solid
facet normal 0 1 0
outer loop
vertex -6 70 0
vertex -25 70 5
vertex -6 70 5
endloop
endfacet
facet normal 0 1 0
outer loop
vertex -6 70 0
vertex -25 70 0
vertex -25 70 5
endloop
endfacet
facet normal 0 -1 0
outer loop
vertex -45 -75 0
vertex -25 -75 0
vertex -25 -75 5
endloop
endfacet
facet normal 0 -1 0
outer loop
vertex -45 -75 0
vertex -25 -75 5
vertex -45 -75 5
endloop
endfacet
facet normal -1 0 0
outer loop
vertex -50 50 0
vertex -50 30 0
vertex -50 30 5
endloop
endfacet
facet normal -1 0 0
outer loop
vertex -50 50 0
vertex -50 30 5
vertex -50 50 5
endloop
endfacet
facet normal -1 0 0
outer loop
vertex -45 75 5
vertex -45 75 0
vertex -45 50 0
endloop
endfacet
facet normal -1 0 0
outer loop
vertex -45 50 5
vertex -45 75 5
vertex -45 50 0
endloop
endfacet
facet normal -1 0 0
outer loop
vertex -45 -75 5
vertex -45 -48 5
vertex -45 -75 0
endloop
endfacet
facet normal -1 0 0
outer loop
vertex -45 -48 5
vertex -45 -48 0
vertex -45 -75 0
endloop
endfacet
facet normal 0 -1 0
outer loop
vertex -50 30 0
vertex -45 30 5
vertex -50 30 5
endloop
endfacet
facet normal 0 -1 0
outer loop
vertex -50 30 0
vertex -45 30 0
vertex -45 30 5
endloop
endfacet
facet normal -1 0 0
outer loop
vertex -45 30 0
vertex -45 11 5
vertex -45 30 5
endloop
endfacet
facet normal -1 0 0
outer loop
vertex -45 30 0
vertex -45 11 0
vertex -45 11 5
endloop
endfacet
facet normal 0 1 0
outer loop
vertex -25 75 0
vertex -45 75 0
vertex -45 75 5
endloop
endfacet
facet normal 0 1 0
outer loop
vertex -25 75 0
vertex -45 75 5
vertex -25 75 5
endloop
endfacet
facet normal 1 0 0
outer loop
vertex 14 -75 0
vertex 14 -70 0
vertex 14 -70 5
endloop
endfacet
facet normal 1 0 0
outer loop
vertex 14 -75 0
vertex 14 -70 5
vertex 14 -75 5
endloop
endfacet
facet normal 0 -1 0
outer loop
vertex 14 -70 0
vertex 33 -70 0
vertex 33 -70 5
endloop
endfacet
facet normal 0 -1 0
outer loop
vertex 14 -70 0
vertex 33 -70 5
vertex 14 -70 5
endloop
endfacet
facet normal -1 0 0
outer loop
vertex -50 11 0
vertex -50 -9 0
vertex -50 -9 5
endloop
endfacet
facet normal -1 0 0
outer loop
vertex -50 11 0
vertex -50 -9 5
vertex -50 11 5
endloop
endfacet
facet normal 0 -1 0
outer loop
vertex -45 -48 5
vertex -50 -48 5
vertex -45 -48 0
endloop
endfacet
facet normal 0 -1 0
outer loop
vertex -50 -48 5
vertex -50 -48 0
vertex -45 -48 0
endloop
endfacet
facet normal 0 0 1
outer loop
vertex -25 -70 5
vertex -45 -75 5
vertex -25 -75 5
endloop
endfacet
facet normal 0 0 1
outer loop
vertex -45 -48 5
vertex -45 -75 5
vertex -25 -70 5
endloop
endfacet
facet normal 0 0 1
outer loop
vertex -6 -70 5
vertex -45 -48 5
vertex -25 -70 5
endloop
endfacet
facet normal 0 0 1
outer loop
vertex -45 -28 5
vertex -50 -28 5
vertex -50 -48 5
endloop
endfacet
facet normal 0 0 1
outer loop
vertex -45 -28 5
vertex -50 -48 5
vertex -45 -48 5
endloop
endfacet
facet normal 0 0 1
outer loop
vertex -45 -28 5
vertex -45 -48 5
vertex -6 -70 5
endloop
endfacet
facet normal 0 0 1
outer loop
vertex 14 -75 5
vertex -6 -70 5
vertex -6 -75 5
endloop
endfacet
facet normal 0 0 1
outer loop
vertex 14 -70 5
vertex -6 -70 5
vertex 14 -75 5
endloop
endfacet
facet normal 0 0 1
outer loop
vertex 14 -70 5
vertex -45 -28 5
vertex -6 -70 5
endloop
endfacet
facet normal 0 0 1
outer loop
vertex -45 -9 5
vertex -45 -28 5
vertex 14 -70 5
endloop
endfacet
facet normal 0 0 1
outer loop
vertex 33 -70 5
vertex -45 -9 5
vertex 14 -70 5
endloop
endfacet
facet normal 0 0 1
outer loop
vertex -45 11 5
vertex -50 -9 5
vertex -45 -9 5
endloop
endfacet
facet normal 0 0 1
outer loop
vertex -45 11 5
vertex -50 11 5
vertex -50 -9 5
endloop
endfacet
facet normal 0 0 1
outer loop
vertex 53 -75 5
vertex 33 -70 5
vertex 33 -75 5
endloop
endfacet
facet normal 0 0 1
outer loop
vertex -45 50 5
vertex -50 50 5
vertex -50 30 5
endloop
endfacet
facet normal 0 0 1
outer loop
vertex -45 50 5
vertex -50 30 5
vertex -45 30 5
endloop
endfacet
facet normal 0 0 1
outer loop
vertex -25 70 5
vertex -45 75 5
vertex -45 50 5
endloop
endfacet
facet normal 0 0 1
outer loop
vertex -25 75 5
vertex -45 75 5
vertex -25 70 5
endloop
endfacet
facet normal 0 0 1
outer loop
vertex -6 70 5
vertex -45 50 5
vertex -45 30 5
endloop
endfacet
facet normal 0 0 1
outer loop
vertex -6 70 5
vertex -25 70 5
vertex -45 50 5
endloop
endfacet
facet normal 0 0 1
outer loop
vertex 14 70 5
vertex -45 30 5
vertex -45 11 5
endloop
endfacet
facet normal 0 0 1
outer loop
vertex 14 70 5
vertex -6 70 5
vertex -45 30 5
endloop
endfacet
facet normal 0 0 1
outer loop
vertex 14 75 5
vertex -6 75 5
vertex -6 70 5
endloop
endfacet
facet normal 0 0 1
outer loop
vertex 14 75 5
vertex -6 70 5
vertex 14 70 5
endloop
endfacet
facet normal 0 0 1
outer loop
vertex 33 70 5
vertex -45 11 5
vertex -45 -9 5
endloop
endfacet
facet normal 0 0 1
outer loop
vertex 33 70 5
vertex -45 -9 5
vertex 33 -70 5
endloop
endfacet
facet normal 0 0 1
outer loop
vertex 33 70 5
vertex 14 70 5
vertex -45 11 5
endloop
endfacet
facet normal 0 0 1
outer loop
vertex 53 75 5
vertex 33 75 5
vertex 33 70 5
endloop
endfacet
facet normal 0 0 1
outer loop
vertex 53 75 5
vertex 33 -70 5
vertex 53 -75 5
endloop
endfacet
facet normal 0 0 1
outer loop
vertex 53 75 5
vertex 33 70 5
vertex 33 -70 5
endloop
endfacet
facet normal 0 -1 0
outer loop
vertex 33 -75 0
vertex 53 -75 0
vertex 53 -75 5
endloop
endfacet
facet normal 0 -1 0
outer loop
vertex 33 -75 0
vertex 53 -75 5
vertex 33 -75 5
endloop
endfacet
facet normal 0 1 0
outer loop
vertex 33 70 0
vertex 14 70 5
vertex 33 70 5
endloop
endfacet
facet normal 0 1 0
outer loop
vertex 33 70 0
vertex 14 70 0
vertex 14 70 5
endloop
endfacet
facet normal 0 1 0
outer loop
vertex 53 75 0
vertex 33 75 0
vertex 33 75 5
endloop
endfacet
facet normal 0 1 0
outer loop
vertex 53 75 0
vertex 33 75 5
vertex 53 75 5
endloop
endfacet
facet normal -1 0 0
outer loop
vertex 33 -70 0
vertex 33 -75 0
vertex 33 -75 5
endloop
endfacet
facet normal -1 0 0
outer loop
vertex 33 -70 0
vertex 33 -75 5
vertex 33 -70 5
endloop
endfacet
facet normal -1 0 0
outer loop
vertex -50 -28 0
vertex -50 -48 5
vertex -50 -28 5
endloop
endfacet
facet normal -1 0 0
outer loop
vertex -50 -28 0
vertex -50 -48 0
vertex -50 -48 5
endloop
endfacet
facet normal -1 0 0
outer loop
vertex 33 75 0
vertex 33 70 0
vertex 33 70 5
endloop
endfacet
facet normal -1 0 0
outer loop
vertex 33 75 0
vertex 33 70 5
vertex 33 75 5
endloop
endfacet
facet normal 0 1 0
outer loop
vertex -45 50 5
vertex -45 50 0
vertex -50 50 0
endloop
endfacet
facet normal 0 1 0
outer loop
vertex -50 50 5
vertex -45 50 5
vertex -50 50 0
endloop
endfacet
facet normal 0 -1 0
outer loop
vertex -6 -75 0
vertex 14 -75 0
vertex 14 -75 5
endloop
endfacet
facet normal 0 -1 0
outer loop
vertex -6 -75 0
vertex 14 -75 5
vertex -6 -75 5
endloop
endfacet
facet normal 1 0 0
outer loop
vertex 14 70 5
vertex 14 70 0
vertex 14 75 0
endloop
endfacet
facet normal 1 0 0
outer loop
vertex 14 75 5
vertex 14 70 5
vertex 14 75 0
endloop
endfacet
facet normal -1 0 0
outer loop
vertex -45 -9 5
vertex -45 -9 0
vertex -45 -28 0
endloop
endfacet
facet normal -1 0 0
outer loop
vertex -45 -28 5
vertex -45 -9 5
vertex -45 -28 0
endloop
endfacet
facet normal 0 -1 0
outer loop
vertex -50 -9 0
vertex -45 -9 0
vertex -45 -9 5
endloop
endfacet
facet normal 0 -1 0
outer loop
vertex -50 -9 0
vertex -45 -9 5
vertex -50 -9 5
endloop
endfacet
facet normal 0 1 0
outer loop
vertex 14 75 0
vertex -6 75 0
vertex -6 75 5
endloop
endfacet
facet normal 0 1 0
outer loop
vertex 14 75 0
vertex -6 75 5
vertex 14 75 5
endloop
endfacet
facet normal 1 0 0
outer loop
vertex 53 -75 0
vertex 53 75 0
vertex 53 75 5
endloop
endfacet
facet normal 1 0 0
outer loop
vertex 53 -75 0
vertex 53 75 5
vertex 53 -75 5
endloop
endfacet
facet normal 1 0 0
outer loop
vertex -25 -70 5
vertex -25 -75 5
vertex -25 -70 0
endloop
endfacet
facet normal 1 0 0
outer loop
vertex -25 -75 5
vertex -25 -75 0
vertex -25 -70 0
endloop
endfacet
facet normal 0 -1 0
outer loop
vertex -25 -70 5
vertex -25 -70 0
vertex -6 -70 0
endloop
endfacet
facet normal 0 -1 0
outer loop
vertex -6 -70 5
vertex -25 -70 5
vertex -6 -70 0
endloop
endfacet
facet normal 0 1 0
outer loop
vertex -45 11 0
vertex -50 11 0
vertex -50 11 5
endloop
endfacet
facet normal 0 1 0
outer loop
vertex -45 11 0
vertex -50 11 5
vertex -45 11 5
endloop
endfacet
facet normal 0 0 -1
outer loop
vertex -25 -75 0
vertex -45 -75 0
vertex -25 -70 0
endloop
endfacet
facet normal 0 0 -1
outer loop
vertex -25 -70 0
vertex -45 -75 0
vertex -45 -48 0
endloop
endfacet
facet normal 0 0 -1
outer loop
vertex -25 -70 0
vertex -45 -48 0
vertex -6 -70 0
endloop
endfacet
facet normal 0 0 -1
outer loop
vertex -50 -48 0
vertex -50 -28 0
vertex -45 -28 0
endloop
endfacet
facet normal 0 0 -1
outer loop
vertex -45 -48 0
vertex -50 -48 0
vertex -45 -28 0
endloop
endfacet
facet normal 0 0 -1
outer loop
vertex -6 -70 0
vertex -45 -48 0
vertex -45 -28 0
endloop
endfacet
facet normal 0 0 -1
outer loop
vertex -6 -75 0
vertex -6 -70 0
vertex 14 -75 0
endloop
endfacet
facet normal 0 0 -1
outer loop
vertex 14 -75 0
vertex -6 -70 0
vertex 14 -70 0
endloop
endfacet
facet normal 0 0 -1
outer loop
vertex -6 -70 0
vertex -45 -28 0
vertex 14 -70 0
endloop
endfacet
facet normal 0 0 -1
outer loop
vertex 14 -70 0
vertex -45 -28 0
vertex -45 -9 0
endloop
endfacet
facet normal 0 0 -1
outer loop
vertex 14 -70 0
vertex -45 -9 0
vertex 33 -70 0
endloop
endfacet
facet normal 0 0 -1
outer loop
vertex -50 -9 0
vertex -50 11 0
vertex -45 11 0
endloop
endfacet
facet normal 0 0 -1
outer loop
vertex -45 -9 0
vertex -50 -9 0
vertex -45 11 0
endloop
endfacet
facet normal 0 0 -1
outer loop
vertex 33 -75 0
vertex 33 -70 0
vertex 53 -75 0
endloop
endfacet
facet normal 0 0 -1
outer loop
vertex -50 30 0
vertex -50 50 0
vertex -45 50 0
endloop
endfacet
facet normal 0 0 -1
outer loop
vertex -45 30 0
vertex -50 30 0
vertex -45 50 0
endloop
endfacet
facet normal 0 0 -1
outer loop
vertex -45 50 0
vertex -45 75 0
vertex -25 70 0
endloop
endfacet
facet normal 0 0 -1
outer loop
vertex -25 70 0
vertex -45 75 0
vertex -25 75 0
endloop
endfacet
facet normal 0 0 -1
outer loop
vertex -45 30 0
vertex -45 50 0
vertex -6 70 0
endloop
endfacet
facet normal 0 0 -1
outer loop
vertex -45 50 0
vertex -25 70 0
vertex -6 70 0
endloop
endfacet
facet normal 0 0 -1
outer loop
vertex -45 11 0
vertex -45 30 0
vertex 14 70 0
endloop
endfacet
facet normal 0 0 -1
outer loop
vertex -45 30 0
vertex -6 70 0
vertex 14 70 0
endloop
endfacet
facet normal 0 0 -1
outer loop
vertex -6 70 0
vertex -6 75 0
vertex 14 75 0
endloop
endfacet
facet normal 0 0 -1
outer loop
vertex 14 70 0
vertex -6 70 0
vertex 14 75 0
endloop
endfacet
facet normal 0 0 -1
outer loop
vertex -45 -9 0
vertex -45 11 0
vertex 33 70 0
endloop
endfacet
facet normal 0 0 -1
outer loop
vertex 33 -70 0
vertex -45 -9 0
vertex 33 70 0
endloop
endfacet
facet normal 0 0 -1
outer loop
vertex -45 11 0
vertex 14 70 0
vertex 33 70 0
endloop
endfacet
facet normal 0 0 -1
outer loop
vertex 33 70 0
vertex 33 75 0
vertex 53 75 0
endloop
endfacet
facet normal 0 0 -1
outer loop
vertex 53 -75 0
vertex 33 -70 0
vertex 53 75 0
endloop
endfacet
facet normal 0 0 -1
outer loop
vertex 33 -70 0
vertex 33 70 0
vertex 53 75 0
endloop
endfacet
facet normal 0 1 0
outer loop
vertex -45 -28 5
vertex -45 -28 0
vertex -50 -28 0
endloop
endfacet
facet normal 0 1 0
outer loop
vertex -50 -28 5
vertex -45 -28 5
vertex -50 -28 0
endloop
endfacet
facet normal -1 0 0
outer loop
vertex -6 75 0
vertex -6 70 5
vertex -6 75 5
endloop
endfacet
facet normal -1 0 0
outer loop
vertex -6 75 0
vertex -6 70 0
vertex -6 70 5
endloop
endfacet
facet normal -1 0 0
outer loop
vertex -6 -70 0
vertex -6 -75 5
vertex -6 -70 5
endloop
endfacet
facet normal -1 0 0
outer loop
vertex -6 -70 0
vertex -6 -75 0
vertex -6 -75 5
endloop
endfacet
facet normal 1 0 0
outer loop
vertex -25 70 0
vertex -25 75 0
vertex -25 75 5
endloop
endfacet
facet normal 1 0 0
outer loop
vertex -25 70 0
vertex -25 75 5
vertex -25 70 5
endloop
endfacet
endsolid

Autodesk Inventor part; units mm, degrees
ref_plane "YZ Plane" through (0, 0, 0) normal (1, 0, 0) x (0, 1, 0)
ref_plane "XZ Plane" through (0, 0, 0) normal (0, 1, 0) x (-1, 0, 0)
ref_plane "XY Plane" through (0, 0, 0) normal (0, 0, 1) x (1, 0, 0)
sketch "Sketch1" plane through (0, 0, 0) normal (0, 0, 1) x (1, 0, 0)
  line L0 (-50, 75) -> (50, 75)
  line L1 (50, 75) -> (50, -75)
  line L2 (50, -75) -> (-50, -75)
  line L3 (-50, -75) -> (-50, 75)
  line L4 (-50, 75) -> (-45, 75)
  line L5 (-45, 75) -> (-45, 50)
  line L6 (-45, 50) -> (-50, 50)
  line L7 (-50, 50) -> (-50, 75)
  line L8 (-50, 50) -> (-45, 50)
  line L9 (-45, 50) -> (-45, 30)
  line L10 (-45, 30) -> (-50, 30)
  line L11 (-50, 30) -> (-50, 50)
  line L12 (-45, 30) -> (-50, 30)
  line L13 (-50, 30) -> (-50, 11)
  line L14 (-50, 11) -> (-45, 11)
  line L15 (-45, 11) -> (-45, 30)
  line L16 (-50, 11) -> (-45, 11)
  line L17 (-45, 11) -> (-45, -9)
  line L18 (-45, -9) -> (-50, -9)
  line L19 (-50, -9) -> (-50, 11)
  line L20 (-50, -9) -> (-45, -9)
  line L21 (-45, -9) -> (-45, -28)
  line L22 (-45, -28) -> (-50, -28)
  line L23 (-50, -28) -> (-50, -9)
  line L24 (-45, -28) -> (-50, -28)
  line L25 (-50, -28) -> (-50, -48)
  line L26 (-50, -48) -> (-45, -48)
  line L27 (-45, -48) -> (-45, -28)
  line L28 (-50, -48) -> (-45, -48)
  line L29 (-45, -48) -> (-45, -67)
  line L30 (-50, -67) -> (-50, -48)
  line L31 (-45, -67) -> (-45, -75)
  line L32 (-45, -75) -> (-50, -75)
  line L33 (-50, -75) -> (-50, -67)
  line L34 (-45, 75) -> (-25, 75)
  line L35 (-25, 75) -> (-25, 70)
  line L36 (-25, 70) -> (-45, 70)
  line L37 (-45, 70) -> (-45, 75)
  line L38 (-25, 70) -> (-6, 70)
  line L39 (-6, 70) -> (-6, 75)
  line L40 (-6, 75) -> (-25, 75)
  line L41 (-25, 75) -> (-25, 70)
  line L42 (-6, 70) -> (14, 70)
  line L43 (14, 70) -> (14, 75)
  line L44 (14, 75) -> (-6, 75)
  line L45 (-6, 75) -> (-6, 70)
  line L46 (14, 70) -> (33, 70)
  line L47 (33, 70) -> (33, 75)
  line L48 (33, 75) -> (14, 75)
  line L49 (14, 75) -> (14, 70)
  line L50 (33, 70) -> (50, 70)
  line L51 (50, 70) -> (50, 75)
  line L52 (50, 75) -> (33, 75)
  line L53 (33, 75) -> (33, 70)
  line L54 (50, 75) -> (53, 75)
  line L55 (53, 75) -> (53, 70)
  line L56 (53, 70) -> (50, 70)
  line L57 (50, 70) -> (50, 75)
  line L58 (53, 70) -> (53, -75)
  line L59 (53, -75) -> (50, -75)
  line L60 (0, 0) -> (92.6837, 0)
  line L61 (92.6837, 0) -> (-105.3184, 0)
  line L62 (53, -75) -> (33, -75)
  line L63 (33, -75) -> (33, -70)
  line L64 (33, -70) -> (53, -70)
  line L65 (53, -70) -> (53, -75)
  line L66 (33, -70) -> (14, -70)
  line L67 (14, -70) -> (14, -75)
  line L68 (14, -75) -> (33, -75)
  line L69 (33, -75) -> (33, -70)
  line L70 (14, -75) -> (-6, -75)
  line L71 (-6, -75) -> (-6, -70)
  line L72 (-6, -70) -> (14, -70)
  line L73 (14, -70) -> (14, -75)
  line L74 (-6, -75) -> (-25, -75)
  line L75 (-25, -75) -> (-25, -70)
  line L76 (-25, -70) -> (-6, -70)
  line L77 (-6, -70) -> (-6, -75)
  line L78 (-25, -75) -> (-45, -75)
  line L79 (-45, -75) -> (-45, -70)
  line L80 (-45, -70) -> (-25, -70)
  line L81 (-25, -70) -> (-25, -75)
  dimension "d0" = 100
  dimension "d1" = 150
  dimension "d2" = 75
  dimension "d3" = 50
  dimension "d4" = 5
  dimension "d5" = 25
  dimension "d6" = 20
  dimension "d7" = 19
  dimension "d8" = 20
  dimension "d9" = 19
  dimension "d10" = 20
  dimension "d11" = 19
  dimension "d12" = 20
  dimension "d13" = 5
  dimension "d14" = 19
  dimension "d15" = 20
  dimension "d16" = 19
  dimension "d17" = 17
  dimension "d18" = 3
  dimension "d19" = 20
  dimension "d20" = 5
  dimension "d21" = 19
  dimension "d22" = 20
  dimension "d23" = 19
extrude "Extrusion1" add sketch "Sketch1" along normal blind 5 contours L0 L35 L36 L5 | L6 L9 L10 L3 | L36 L38 L42 L46 L50 L1 L60 L61 L17 L15 L9 L5 | L0 L43 L42 L39 | L14 L17 L61 L3 | L61 L17 L18 L3 | L0 L1 L50 L47 | L61 L60 L1 L64 L66 L72 L76 L80 L31 L29 L27 L21 L17 | L54 L55 L56 L1 | L22 L27 L26 L3 | L56 L58 L60 L1 | L60 L58 L64 L1 | L64 L58 L59 L1 | L1 L2 L63 L64 | L31 L80 L75 L2 | L67 L2 L71 L72
